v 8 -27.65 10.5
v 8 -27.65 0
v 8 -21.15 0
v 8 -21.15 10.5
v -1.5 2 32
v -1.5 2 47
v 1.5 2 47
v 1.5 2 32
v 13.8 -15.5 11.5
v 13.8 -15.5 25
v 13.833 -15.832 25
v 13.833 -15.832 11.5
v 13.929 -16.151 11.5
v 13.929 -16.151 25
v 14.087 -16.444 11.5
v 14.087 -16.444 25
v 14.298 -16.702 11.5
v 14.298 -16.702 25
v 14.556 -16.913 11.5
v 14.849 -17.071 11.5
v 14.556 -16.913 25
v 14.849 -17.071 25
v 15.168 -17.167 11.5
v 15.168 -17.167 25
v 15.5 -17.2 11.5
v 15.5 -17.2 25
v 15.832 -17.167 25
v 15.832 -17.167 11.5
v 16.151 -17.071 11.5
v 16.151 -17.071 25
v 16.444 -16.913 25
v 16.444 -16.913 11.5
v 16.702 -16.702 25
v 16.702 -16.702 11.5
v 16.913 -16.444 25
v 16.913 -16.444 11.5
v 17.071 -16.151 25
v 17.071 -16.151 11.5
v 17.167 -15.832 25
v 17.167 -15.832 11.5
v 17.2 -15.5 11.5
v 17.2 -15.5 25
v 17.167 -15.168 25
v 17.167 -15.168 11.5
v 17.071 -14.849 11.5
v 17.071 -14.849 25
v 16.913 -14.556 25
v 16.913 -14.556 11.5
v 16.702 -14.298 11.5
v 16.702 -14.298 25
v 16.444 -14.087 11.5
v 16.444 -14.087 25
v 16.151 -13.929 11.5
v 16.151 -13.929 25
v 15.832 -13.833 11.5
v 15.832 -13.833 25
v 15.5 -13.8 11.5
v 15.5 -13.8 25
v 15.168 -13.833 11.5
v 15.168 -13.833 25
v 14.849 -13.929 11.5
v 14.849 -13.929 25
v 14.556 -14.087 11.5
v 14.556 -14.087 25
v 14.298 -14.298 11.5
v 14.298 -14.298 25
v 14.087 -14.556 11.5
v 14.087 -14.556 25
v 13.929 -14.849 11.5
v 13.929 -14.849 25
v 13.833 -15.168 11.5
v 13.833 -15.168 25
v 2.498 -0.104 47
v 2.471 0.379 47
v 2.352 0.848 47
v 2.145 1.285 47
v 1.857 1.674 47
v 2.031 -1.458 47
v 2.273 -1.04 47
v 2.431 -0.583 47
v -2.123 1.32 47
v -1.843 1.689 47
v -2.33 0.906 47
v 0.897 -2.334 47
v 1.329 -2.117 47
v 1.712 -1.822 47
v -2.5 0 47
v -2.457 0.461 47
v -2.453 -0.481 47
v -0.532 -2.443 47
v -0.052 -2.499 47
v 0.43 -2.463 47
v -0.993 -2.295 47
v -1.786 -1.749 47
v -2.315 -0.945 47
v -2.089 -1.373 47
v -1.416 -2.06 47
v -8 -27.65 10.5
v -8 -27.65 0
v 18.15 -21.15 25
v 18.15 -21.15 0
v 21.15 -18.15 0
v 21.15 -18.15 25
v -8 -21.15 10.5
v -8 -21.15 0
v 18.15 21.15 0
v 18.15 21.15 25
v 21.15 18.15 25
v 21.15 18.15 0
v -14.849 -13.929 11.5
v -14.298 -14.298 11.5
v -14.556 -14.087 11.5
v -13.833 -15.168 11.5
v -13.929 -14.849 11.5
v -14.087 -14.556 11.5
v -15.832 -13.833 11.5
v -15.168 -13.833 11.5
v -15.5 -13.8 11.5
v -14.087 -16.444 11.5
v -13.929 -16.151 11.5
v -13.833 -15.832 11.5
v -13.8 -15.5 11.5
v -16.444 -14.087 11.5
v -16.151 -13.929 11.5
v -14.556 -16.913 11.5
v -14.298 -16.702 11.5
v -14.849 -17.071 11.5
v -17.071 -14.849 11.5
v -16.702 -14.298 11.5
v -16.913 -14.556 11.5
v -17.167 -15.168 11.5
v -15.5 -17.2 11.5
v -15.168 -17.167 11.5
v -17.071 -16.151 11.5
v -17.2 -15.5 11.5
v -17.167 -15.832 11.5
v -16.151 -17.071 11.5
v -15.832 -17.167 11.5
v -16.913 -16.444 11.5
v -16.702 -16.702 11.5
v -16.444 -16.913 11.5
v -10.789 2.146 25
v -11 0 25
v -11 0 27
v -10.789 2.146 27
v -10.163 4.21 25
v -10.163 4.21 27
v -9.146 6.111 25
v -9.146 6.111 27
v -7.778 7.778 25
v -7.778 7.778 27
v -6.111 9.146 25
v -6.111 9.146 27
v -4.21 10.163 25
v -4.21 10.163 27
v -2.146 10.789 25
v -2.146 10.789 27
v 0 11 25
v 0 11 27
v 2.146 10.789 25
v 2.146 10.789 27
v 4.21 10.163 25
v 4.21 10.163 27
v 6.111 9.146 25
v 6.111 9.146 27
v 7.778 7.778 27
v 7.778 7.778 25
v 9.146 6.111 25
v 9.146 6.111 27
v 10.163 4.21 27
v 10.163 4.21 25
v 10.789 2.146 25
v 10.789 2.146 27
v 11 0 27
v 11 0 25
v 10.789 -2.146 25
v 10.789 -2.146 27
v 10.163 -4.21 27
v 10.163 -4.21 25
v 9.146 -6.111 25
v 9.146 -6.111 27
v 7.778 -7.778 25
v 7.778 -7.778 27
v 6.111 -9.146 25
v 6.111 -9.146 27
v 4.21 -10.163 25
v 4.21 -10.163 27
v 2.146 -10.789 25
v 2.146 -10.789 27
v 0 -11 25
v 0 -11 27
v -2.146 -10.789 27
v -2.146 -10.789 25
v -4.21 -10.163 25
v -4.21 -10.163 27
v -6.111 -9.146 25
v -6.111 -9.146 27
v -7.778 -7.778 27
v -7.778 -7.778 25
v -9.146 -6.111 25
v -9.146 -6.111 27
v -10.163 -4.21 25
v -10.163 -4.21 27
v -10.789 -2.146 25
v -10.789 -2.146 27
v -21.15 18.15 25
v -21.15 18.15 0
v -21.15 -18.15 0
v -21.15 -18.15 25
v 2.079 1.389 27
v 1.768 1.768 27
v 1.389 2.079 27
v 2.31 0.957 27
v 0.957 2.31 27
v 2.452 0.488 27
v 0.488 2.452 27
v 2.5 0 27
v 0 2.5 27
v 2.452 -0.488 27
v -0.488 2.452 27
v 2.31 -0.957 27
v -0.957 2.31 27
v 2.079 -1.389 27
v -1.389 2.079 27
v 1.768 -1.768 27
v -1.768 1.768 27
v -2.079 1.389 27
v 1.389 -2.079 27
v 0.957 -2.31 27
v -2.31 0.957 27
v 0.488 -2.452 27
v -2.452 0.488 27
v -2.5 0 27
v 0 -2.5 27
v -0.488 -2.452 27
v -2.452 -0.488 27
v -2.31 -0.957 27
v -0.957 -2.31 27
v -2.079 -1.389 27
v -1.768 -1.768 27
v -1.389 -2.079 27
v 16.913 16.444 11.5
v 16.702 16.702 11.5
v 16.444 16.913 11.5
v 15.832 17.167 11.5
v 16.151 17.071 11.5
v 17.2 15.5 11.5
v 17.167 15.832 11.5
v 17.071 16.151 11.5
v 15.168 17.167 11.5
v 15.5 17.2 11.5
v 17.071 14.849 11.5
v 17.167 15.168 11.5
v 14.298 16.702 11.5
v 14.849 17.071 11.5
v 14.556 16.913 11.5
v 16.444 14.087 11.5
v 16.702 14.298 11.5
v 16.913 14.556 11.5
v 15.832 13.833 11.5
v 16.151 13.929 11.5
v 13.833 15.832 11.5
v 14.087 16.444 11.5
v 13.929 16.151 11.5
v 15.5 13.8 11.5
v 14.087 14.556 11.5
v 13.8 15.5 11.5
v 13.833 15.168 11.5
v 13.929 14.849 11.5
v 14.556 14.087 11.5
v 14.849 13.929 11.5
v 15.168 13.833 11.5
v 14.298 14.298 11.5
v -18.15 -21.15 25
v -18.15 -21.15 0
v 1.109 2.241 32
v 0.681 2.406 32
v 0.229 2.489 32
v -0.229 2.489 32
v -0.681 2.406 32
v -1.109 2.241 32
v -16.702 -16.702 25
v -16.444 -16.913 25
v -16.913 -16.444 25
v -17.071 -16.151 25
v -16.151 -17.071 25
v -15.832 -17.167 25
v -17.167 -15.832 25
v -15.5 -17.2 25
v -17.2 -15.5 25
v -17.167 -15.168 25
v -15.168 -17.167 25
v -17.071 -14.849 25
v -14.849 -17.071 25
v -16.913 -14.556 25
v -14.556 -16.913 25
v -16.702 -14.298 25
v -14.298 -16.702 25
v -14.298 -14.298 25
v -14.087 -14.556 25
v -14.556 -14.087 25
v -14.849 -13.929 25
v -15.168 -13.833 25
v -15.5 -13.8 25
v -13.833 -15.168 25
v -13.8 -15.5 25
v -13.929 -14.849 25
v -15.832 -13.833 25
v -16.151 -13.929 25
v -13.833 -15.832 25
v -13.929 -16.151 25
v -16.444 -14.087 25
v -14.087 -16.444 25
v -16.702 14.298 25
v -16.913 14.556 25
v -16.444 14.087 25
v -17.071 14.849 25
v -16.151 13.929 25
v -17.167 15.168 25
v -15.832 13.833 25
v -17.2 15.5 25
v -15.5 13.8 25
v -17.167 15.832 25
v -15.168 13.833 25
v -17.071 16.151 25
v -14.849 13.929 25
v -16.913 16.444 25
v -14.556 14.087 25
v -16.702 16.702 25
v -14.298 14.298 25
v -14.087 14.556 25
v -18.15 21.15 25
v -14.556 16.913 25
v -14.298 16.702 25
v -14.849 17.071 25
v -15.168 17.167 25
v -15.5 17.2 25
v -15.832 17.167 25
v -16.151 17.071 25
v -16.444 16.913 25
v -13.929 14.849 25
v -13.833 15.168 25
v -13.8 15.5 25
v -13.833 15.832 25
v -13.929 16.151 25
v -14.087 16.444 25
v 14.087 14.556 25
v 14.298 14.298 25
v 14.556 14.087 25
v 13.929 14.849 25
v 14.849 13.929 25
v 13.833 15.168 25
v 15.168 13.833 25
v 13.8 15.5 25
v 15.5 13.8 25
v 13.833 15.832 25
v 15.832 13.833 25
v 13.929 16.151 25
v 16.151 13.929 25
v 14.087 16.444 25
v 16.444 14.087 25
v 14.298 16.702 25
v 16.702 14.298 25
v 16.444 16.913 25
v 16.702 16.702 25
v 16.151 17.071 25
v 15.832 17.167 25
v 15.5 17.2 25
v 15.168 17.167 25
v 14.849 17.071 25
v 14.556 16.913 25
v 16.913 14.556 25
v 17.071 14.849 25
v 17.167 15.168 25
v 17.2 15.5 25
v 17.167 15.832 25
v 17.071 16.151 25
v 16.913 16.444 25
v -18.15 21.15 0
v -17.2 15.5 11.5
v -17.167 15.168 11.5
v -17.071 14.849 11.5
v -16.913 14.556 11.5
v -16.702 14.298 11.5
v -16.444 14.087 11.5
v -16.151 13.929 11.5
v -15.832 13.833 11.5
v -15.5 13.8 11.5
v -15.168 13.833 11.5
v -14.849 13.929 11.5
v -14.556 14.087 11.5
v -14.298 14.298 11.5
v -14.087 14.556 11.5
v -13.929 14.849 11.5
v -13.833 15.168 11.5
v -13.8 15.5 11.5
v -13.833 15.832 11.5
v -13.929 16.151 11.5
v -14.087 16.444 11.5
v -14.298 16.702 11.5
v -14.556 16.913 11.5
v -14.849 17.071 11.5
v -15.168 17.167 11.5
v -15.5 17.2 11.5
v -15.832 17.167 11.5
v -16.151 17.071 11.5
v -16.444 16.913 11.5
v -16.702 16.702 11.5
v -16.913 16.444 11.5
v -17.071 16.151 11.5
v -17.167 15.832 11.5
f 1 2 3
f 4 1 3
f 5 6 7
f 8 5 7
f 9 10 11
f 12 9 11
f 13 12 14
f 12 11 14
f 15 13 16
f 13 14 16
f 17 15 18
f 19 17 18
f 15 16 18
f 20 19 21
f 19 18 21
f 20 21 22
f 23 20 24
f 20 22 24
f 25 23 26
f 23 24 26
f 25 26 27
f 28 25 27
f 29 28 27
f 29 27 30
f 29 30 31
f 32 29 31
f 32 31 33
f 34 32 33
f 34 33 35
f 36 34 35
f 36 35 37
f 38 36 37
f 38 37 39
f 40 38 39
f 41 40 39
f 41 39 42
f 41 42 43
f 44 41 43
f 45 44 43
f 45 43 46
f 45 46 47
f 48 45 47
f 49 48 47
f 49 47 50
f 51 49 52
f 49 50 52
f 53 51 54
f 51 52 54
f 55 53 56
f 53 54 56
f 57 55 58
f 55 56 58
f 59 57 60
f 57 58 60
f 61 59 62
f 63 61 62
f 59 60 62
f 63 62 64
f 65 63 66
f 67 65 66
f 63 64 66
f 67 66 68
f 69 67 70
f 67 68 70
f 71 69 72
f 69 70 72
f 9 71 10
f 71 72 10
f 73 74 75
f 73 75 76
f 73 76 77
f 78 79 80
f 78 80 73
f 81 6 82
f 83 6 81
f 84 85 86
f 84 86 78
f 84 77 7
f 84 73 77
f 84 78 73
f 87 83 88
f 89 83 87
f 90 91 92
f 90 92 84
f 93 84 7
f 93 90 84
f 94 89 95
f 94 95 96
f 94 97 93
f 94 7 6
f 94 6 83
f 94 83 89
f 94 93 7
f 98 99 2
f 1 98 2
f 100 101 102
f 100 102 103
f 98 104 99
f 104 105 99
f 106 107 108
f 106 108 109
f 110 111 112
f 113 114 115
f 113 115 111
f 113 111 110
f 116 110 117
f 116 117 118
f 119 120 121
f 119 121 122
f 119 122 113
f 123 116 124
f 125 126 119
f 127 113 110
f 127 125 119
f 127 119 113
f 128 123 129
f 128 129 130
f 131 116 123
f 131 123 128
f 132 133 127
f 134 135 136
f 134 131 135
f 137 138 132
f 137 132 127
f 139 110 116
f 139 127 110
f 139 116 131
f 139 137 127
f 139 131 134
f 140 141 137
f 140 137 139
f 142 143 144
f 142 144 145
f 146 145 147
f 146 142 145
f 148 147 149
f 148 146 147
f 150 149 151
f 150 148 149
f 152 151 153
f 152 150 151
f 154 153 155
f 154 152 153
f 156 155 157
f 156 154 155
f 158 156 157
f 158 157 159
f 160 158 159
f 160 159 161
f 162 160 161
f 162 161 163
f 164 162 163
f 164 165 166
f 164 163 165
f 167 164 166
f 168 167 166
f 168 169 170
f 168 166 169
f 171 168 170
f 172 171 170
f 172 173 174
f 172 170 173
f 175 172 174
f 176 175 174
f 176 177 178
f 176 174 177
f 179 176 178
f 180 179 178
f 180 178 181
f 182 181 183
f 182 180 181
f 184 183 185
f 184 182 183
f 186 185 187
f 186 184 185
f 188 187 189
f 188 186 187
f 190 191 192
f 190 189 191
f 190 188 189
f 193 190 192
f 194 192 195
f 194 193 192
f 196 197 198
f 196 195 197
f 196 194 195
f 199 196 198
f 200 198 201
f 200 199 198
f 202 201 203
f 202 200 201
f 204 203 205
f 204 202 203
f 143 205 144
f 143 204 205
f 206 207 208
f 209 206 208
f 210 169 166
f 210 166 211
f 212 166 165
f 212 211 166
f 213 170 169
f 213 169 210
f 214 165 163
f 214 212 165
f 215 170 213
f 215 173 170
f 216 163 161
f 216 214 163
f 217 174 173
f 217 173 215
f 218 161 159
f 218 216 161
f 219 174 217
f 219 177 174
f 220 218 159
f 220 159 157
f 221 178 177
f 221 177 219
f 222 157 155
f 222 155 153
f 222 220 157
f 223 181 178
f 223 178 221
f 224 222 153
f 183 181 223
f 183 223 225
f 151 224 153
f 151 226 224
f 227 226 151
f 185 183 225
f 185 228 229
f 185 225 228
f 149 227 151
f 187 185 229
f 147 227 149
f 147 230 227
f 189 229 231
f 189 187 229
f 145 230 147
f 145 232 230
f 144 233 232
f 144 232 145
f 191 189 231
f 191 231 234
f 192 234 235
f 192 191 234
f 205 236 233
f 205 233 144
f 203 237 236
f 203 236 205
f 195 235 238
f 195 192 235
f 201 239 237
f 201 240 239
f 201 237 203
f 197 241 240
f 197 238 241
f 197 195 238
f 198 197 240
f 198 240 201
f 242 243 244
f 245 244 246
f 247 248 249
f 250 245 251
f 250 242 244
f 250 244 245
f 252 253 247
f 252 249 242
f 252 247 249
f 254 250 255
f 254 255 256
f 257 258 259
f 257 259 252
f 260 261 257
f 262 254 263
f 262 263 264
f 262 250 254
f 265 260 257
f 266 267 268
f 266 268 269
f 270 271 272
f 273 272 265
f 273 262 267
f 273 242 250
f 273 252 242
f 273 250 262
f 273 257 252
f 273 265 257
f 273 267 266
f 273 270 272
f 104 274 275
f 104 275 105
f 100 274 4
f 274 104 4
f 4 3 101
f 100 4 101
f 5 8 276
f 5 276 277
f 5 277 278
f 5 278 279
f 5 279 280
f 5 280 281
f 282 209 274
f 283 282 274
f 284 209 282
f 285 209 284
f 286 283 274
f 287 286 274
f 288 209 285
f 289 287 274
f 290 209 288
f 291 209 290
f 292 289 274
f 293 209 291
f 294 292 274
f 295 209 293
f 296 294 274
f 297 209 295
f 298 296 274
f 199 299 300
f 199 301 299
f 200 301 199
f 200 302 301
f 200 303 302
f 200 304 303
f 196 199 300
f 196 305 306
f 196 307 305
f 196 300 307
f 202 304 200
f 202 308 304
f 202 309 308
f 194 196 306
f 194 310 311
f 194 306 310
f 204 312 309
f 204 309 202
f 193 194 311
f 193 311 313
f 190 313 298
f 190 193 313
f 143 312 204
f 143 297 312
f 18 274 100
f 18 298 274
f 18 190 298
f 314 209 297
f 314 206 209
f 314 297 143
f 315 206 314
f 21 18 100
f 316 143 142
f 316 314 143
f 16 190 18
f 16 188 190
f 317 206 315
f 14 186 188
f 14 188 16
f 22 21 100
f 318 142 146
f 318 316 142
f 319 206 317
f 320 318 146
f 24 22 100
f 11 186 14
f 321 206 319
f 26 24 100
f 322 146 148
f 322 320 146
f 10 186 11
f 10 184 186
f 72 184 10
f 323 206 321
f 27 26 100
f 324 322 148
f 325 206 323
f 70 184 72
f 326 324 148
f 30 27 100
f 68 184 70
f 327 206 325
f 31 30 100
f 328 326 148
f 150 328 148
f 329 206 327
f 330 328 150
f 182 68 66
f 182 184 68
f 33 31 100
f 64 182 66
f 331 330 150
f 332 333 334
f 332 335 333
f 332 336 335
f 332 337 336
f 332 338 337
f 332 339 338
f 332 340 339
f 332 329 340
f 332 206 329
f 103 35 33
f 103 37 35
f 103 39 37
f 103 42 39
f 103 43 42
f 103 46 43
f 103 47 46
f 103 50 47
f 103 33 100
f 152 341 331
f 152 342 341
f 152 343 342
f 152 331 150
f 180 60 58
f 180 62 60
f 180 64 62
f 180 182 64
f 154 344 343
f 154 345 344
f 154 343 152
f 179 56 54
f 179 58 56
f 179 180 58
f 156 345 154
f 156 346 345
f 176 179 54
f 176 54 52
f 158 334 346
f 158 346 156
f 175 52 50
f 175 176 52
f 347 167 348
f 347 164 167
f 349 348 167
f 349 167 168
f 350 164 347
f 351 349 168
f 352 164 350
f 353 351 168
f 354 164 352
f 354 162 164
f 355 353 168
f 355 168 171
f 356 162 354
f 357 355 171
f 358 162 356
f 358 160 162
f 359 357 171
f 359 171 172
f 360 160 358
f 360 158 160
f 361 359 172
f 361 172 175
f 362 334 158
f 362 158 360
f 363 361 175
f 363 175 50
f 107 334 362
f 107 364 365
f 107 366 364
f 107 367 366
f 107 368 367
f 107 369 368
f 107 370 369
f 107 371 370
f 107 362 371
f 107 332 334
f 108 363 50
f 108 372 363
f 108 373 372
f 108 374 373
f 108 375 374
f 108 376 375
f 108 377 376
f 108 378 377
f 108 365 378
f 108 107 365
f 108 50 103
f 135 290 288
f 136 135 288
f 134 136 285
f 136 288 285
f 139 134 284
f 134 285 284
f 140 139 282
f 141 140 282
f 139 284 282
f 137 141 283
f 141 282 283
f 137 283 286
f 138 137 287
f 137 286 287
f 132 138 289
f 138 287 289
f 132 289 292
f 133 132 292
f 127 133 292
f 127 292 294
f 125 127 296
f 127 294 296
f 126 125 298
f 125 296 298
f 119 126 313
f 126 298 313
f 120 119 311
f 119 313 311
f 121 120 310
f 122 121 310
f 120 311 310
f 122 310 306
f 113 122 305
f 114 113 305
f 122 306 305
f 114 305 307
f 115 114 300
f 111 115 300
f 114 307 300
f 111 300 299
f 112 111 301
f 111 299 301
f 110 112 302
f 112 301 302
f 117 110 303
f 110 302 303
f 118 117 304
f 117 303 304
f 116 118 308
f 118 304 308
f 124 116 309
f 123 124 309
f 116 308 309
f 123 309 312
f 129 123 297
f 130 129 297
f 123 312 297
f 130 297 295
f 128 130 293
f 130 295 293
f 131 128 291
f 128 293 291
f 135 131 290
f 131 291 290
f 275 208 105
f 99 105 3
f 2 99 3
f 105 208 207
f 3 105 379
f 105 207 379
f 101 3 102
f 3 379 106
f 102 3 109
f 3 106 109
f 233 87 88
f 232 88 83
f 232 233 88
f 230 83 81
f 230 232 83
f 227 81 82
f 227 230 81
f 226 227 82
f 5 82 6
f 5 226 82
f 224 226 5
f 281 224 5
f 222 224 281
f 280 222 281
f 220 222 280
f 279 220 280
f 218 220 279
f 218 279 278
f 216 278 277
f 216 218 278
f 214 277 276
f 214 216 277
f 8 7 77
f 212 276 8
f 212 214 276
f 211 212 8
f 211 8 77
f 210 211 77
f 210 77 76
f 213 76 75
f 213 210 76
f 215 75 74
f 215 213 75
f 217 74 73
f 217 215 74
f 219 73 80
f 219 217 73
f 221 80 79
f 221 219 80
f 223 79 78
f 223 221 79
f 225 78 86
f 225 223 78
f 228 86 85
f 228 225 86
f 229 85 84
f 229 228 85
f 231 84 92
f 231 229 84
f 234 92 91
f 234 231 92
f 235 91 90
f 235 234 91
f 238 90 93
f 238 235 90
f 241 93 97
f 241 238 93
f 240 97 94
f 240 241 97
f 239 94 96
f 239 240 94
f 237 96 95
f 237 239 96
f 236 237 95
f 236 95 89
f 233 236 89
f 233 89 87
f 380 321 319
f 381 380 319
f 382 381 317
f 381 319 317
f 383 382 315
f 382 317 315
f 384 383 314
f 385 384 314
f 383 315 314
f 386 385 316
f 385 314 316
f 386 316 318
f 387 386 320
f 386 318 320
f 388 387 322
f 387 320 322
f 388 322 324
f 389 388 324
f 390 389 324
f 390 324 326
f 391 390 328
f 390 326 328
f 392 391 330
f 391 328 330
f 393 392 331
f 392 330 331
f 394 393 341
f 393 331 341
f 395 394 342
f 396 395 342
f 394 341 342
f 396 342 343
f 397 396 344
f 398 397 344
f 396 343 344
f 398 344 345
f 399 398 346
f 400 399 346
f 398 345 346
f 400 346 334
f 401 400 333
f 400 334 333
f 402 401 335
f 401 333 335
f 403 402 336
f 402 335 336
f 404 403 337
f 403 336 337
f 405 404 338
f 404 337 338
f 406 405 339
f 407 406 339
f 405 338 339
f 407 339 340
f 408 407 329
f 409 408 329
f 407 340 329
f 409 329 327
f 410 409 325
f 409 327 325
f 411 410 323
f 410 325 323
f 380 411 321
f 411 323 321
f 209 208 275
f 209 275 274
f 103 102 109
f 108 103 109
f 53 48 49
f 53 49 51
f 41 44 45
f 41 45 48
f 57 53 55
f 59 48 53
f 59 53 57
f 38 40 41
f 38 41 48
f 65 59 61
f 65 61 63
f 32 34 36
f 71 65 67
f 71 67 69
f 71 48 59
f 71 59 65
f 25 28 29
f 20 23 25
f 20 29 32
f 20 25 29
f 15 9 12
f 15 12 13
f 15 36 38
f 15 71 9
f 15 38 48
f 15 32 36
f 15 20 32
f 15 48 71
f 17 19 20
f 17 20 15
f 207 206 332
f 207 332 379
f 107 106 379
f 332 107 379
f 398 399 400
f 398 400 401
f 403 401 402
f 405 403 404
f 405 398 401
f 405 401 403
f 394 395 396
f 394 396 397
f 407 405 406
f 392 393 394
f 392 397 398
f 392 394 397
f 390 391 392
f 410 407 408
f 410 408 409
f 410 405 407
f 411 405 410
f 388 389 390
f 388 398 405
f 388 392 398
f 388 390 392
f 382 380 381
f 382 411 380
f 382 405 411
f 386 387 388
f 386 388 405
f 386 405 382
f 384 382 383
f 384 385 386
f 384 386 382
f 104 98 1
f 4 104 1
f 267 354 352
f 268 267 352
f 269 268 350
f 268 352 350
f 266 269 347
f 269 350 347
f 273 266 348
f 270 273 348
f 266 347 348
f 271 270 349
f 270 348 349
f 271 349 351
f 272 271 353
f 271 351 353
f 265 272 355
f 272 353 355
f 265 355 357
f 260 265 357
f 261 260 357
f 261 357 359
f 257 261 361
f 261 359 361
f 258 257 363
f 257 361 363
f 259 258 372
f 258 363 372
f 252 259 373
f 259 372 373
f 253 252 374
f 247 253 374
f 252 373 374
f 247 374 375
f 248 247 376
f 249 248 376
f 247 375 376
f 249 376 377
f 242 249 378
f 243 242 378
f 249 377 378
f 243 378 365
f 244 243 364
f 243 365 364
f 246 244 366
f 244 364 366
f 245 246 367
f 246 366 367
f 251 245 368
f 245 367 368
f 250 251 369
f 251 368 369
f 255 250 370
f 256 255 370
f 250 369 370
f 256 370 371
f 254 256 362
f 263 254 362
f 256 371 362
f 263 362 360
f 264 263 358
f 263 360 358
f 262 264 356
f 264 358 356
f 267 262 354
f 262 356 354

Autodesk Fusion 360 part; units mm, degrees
sketch "Esquisse1" plane through (0, 0, 0) normal (0, 0, 1) x (1, 0, 0)
  line L0 (21.15, 21.15) -> (-21.15, 21.15)
  line L1 (-21.15, 21.15) -> (-21.15, -21.15)
  line L2 (-21.15, -21.15) -> (21.15, -21.15)
  line L3 (21.15, -21.15) -> (21.15, 21.15)
  line L4 (21.15, 21.15) -> (-21.15, -21.15) construction
  line L5 (-21.15, 21.15) -> (21.15, -21.15) construction
  dimension "d1" = 42.3
  dimension "d2" = 42.3
extrude "Extrusion1" add sketch "Esquisse1" along normal blind 25
sketch "Esquisse2" plane through (0, 0, 25) normal (0, 0, 1) x (-1, 0, 0)
  line L0 (-21.15, 21.15) -> (-21.15, -21.15)
  line L1 (-21.15, -21.15) -> (21.15, -21.15)
  line L2 (21.15, -21.15) -> (21.15, 21.15)
  line L3 (21.15, 21.15) -> (-21.15, 21.15)
  circle A0 centre (15.5, -15.5) radius 1.7
  circle A1 centre (-15.5, -15.5) radius 1.7
  circle A2 centre (15.5, 15.5) radius 1.7
  circle A3 centre (-15.5, 15.5) radius 1.7
  dimension "d5" = 3.4
  dimension "d6" = 3.4
  dimension "d7" = 3.4
  dimension "d8" = 3.4
  dimension "d9" = 5.65
  dimension "d10" = 5.65
  dimension "d11" = 5.65
  dimension "d12" = 5.65
  dimension "d13" = 5.65
  dimension "d14" = 5.65
  dimension "d15" = 5.65
  dimension "d16" = 5.65
extrude "Extrusion2" cut sketch "Esquisse2" against normal blind 13.5 contours A0 | A1 | A2 | A3
sketch "Esquisse3" plane through (0, 0, 25) normal (0, 0, 1) x (-1, 0, 0)
  circle A0 centre (-15.5, -15.5) radius 1.7
  circle A1 centre (-15.5, 15.5) radius 1.7
  circle A2 centre (15.5, -15.5) radius 1.7
  circle A3 centre (15.5, 15.5) radius 1.7
  line L0 (-21.15, 21.15) -> (-21.15, -21.15)
  line L1 (-21.15, -21.15) -> (21.15, -21.15)
  line L2 (21.15, -21.15) -> (21.15, 21.15)
  line L3 (21.15, 21.15) -> (-21.15, 21.15)
  circle A4 centre (0, 0) radius 11
  circle A5 centre (0, 0) radius 2.5
  dimension "d19" = 22
  dimension "d20" = 5
extrude "Extrusion3" add sketch "Esquisse3" along normal blind 22 contours A5
extrude "Extrusion4" add sketch "Esquisse3" along normal blind 2 contours A4
sketch "Esquisse4" plane through (0, 0, 47) normal (0, 0, 1) x (-1, 0, 0)
  circle A0 centre (0, 0) radius 2.5
  line L0 (1.5, -2) -> (-1.5, -2)
  circle A1 centre (0, 0) radius 2.5
  dimension "d25" = 2
extrude "Extrusion5" cut sketch "Esquisse4" against normal blind 15 contours A0 L0 A1 picked at (-0.3999, -2.0645)
sketch "Esquisse5" plane through (0, 0, 0) normal (0, 0, -1) x (1, 0, 0)
  line L0 (21.15, -21.15) -> (21.15, 21.15)
  line L1 (21.15, 21.15) -> (-21.15, 21.15)
  line L2 (-21.15, 21.15) -> (-21.15, -21.15)
  line L3 (-21.15, -21.15) -> (21.15, -21.15)
  line L4 (8, 21.15) -> (-8, 21.15)
  line L5 (-8, 21.15) -> (-8, 27.65)
  line L6 (-8, 27.65) -> (8, 27.65)
  line L7 (8, 27.65) -> (8, 21.15)
  line L8 (8, 21.15) -> (-8, 27.65) construction
  line L9 (-8, 21.15) -> (8, 27.65) construction
  point P0 (0, 24.4)
  dimension "d28" = 6.5
  dimension "d29" = 16
  dimension "d30" = 13.15
extrude "Extrusion6" add sketch "Esquisse5" against normal blind 10.5 contours L1 L4 L5 L6 L7
chamfer "Chanfrein1" distance 3 angle 45 4 edges at (21.15, 21.15, 12.5) (21.15, -21.15, 12.5) (-21.15, 21.15, 12.5) (-21.15, -21.15, 12.5)
